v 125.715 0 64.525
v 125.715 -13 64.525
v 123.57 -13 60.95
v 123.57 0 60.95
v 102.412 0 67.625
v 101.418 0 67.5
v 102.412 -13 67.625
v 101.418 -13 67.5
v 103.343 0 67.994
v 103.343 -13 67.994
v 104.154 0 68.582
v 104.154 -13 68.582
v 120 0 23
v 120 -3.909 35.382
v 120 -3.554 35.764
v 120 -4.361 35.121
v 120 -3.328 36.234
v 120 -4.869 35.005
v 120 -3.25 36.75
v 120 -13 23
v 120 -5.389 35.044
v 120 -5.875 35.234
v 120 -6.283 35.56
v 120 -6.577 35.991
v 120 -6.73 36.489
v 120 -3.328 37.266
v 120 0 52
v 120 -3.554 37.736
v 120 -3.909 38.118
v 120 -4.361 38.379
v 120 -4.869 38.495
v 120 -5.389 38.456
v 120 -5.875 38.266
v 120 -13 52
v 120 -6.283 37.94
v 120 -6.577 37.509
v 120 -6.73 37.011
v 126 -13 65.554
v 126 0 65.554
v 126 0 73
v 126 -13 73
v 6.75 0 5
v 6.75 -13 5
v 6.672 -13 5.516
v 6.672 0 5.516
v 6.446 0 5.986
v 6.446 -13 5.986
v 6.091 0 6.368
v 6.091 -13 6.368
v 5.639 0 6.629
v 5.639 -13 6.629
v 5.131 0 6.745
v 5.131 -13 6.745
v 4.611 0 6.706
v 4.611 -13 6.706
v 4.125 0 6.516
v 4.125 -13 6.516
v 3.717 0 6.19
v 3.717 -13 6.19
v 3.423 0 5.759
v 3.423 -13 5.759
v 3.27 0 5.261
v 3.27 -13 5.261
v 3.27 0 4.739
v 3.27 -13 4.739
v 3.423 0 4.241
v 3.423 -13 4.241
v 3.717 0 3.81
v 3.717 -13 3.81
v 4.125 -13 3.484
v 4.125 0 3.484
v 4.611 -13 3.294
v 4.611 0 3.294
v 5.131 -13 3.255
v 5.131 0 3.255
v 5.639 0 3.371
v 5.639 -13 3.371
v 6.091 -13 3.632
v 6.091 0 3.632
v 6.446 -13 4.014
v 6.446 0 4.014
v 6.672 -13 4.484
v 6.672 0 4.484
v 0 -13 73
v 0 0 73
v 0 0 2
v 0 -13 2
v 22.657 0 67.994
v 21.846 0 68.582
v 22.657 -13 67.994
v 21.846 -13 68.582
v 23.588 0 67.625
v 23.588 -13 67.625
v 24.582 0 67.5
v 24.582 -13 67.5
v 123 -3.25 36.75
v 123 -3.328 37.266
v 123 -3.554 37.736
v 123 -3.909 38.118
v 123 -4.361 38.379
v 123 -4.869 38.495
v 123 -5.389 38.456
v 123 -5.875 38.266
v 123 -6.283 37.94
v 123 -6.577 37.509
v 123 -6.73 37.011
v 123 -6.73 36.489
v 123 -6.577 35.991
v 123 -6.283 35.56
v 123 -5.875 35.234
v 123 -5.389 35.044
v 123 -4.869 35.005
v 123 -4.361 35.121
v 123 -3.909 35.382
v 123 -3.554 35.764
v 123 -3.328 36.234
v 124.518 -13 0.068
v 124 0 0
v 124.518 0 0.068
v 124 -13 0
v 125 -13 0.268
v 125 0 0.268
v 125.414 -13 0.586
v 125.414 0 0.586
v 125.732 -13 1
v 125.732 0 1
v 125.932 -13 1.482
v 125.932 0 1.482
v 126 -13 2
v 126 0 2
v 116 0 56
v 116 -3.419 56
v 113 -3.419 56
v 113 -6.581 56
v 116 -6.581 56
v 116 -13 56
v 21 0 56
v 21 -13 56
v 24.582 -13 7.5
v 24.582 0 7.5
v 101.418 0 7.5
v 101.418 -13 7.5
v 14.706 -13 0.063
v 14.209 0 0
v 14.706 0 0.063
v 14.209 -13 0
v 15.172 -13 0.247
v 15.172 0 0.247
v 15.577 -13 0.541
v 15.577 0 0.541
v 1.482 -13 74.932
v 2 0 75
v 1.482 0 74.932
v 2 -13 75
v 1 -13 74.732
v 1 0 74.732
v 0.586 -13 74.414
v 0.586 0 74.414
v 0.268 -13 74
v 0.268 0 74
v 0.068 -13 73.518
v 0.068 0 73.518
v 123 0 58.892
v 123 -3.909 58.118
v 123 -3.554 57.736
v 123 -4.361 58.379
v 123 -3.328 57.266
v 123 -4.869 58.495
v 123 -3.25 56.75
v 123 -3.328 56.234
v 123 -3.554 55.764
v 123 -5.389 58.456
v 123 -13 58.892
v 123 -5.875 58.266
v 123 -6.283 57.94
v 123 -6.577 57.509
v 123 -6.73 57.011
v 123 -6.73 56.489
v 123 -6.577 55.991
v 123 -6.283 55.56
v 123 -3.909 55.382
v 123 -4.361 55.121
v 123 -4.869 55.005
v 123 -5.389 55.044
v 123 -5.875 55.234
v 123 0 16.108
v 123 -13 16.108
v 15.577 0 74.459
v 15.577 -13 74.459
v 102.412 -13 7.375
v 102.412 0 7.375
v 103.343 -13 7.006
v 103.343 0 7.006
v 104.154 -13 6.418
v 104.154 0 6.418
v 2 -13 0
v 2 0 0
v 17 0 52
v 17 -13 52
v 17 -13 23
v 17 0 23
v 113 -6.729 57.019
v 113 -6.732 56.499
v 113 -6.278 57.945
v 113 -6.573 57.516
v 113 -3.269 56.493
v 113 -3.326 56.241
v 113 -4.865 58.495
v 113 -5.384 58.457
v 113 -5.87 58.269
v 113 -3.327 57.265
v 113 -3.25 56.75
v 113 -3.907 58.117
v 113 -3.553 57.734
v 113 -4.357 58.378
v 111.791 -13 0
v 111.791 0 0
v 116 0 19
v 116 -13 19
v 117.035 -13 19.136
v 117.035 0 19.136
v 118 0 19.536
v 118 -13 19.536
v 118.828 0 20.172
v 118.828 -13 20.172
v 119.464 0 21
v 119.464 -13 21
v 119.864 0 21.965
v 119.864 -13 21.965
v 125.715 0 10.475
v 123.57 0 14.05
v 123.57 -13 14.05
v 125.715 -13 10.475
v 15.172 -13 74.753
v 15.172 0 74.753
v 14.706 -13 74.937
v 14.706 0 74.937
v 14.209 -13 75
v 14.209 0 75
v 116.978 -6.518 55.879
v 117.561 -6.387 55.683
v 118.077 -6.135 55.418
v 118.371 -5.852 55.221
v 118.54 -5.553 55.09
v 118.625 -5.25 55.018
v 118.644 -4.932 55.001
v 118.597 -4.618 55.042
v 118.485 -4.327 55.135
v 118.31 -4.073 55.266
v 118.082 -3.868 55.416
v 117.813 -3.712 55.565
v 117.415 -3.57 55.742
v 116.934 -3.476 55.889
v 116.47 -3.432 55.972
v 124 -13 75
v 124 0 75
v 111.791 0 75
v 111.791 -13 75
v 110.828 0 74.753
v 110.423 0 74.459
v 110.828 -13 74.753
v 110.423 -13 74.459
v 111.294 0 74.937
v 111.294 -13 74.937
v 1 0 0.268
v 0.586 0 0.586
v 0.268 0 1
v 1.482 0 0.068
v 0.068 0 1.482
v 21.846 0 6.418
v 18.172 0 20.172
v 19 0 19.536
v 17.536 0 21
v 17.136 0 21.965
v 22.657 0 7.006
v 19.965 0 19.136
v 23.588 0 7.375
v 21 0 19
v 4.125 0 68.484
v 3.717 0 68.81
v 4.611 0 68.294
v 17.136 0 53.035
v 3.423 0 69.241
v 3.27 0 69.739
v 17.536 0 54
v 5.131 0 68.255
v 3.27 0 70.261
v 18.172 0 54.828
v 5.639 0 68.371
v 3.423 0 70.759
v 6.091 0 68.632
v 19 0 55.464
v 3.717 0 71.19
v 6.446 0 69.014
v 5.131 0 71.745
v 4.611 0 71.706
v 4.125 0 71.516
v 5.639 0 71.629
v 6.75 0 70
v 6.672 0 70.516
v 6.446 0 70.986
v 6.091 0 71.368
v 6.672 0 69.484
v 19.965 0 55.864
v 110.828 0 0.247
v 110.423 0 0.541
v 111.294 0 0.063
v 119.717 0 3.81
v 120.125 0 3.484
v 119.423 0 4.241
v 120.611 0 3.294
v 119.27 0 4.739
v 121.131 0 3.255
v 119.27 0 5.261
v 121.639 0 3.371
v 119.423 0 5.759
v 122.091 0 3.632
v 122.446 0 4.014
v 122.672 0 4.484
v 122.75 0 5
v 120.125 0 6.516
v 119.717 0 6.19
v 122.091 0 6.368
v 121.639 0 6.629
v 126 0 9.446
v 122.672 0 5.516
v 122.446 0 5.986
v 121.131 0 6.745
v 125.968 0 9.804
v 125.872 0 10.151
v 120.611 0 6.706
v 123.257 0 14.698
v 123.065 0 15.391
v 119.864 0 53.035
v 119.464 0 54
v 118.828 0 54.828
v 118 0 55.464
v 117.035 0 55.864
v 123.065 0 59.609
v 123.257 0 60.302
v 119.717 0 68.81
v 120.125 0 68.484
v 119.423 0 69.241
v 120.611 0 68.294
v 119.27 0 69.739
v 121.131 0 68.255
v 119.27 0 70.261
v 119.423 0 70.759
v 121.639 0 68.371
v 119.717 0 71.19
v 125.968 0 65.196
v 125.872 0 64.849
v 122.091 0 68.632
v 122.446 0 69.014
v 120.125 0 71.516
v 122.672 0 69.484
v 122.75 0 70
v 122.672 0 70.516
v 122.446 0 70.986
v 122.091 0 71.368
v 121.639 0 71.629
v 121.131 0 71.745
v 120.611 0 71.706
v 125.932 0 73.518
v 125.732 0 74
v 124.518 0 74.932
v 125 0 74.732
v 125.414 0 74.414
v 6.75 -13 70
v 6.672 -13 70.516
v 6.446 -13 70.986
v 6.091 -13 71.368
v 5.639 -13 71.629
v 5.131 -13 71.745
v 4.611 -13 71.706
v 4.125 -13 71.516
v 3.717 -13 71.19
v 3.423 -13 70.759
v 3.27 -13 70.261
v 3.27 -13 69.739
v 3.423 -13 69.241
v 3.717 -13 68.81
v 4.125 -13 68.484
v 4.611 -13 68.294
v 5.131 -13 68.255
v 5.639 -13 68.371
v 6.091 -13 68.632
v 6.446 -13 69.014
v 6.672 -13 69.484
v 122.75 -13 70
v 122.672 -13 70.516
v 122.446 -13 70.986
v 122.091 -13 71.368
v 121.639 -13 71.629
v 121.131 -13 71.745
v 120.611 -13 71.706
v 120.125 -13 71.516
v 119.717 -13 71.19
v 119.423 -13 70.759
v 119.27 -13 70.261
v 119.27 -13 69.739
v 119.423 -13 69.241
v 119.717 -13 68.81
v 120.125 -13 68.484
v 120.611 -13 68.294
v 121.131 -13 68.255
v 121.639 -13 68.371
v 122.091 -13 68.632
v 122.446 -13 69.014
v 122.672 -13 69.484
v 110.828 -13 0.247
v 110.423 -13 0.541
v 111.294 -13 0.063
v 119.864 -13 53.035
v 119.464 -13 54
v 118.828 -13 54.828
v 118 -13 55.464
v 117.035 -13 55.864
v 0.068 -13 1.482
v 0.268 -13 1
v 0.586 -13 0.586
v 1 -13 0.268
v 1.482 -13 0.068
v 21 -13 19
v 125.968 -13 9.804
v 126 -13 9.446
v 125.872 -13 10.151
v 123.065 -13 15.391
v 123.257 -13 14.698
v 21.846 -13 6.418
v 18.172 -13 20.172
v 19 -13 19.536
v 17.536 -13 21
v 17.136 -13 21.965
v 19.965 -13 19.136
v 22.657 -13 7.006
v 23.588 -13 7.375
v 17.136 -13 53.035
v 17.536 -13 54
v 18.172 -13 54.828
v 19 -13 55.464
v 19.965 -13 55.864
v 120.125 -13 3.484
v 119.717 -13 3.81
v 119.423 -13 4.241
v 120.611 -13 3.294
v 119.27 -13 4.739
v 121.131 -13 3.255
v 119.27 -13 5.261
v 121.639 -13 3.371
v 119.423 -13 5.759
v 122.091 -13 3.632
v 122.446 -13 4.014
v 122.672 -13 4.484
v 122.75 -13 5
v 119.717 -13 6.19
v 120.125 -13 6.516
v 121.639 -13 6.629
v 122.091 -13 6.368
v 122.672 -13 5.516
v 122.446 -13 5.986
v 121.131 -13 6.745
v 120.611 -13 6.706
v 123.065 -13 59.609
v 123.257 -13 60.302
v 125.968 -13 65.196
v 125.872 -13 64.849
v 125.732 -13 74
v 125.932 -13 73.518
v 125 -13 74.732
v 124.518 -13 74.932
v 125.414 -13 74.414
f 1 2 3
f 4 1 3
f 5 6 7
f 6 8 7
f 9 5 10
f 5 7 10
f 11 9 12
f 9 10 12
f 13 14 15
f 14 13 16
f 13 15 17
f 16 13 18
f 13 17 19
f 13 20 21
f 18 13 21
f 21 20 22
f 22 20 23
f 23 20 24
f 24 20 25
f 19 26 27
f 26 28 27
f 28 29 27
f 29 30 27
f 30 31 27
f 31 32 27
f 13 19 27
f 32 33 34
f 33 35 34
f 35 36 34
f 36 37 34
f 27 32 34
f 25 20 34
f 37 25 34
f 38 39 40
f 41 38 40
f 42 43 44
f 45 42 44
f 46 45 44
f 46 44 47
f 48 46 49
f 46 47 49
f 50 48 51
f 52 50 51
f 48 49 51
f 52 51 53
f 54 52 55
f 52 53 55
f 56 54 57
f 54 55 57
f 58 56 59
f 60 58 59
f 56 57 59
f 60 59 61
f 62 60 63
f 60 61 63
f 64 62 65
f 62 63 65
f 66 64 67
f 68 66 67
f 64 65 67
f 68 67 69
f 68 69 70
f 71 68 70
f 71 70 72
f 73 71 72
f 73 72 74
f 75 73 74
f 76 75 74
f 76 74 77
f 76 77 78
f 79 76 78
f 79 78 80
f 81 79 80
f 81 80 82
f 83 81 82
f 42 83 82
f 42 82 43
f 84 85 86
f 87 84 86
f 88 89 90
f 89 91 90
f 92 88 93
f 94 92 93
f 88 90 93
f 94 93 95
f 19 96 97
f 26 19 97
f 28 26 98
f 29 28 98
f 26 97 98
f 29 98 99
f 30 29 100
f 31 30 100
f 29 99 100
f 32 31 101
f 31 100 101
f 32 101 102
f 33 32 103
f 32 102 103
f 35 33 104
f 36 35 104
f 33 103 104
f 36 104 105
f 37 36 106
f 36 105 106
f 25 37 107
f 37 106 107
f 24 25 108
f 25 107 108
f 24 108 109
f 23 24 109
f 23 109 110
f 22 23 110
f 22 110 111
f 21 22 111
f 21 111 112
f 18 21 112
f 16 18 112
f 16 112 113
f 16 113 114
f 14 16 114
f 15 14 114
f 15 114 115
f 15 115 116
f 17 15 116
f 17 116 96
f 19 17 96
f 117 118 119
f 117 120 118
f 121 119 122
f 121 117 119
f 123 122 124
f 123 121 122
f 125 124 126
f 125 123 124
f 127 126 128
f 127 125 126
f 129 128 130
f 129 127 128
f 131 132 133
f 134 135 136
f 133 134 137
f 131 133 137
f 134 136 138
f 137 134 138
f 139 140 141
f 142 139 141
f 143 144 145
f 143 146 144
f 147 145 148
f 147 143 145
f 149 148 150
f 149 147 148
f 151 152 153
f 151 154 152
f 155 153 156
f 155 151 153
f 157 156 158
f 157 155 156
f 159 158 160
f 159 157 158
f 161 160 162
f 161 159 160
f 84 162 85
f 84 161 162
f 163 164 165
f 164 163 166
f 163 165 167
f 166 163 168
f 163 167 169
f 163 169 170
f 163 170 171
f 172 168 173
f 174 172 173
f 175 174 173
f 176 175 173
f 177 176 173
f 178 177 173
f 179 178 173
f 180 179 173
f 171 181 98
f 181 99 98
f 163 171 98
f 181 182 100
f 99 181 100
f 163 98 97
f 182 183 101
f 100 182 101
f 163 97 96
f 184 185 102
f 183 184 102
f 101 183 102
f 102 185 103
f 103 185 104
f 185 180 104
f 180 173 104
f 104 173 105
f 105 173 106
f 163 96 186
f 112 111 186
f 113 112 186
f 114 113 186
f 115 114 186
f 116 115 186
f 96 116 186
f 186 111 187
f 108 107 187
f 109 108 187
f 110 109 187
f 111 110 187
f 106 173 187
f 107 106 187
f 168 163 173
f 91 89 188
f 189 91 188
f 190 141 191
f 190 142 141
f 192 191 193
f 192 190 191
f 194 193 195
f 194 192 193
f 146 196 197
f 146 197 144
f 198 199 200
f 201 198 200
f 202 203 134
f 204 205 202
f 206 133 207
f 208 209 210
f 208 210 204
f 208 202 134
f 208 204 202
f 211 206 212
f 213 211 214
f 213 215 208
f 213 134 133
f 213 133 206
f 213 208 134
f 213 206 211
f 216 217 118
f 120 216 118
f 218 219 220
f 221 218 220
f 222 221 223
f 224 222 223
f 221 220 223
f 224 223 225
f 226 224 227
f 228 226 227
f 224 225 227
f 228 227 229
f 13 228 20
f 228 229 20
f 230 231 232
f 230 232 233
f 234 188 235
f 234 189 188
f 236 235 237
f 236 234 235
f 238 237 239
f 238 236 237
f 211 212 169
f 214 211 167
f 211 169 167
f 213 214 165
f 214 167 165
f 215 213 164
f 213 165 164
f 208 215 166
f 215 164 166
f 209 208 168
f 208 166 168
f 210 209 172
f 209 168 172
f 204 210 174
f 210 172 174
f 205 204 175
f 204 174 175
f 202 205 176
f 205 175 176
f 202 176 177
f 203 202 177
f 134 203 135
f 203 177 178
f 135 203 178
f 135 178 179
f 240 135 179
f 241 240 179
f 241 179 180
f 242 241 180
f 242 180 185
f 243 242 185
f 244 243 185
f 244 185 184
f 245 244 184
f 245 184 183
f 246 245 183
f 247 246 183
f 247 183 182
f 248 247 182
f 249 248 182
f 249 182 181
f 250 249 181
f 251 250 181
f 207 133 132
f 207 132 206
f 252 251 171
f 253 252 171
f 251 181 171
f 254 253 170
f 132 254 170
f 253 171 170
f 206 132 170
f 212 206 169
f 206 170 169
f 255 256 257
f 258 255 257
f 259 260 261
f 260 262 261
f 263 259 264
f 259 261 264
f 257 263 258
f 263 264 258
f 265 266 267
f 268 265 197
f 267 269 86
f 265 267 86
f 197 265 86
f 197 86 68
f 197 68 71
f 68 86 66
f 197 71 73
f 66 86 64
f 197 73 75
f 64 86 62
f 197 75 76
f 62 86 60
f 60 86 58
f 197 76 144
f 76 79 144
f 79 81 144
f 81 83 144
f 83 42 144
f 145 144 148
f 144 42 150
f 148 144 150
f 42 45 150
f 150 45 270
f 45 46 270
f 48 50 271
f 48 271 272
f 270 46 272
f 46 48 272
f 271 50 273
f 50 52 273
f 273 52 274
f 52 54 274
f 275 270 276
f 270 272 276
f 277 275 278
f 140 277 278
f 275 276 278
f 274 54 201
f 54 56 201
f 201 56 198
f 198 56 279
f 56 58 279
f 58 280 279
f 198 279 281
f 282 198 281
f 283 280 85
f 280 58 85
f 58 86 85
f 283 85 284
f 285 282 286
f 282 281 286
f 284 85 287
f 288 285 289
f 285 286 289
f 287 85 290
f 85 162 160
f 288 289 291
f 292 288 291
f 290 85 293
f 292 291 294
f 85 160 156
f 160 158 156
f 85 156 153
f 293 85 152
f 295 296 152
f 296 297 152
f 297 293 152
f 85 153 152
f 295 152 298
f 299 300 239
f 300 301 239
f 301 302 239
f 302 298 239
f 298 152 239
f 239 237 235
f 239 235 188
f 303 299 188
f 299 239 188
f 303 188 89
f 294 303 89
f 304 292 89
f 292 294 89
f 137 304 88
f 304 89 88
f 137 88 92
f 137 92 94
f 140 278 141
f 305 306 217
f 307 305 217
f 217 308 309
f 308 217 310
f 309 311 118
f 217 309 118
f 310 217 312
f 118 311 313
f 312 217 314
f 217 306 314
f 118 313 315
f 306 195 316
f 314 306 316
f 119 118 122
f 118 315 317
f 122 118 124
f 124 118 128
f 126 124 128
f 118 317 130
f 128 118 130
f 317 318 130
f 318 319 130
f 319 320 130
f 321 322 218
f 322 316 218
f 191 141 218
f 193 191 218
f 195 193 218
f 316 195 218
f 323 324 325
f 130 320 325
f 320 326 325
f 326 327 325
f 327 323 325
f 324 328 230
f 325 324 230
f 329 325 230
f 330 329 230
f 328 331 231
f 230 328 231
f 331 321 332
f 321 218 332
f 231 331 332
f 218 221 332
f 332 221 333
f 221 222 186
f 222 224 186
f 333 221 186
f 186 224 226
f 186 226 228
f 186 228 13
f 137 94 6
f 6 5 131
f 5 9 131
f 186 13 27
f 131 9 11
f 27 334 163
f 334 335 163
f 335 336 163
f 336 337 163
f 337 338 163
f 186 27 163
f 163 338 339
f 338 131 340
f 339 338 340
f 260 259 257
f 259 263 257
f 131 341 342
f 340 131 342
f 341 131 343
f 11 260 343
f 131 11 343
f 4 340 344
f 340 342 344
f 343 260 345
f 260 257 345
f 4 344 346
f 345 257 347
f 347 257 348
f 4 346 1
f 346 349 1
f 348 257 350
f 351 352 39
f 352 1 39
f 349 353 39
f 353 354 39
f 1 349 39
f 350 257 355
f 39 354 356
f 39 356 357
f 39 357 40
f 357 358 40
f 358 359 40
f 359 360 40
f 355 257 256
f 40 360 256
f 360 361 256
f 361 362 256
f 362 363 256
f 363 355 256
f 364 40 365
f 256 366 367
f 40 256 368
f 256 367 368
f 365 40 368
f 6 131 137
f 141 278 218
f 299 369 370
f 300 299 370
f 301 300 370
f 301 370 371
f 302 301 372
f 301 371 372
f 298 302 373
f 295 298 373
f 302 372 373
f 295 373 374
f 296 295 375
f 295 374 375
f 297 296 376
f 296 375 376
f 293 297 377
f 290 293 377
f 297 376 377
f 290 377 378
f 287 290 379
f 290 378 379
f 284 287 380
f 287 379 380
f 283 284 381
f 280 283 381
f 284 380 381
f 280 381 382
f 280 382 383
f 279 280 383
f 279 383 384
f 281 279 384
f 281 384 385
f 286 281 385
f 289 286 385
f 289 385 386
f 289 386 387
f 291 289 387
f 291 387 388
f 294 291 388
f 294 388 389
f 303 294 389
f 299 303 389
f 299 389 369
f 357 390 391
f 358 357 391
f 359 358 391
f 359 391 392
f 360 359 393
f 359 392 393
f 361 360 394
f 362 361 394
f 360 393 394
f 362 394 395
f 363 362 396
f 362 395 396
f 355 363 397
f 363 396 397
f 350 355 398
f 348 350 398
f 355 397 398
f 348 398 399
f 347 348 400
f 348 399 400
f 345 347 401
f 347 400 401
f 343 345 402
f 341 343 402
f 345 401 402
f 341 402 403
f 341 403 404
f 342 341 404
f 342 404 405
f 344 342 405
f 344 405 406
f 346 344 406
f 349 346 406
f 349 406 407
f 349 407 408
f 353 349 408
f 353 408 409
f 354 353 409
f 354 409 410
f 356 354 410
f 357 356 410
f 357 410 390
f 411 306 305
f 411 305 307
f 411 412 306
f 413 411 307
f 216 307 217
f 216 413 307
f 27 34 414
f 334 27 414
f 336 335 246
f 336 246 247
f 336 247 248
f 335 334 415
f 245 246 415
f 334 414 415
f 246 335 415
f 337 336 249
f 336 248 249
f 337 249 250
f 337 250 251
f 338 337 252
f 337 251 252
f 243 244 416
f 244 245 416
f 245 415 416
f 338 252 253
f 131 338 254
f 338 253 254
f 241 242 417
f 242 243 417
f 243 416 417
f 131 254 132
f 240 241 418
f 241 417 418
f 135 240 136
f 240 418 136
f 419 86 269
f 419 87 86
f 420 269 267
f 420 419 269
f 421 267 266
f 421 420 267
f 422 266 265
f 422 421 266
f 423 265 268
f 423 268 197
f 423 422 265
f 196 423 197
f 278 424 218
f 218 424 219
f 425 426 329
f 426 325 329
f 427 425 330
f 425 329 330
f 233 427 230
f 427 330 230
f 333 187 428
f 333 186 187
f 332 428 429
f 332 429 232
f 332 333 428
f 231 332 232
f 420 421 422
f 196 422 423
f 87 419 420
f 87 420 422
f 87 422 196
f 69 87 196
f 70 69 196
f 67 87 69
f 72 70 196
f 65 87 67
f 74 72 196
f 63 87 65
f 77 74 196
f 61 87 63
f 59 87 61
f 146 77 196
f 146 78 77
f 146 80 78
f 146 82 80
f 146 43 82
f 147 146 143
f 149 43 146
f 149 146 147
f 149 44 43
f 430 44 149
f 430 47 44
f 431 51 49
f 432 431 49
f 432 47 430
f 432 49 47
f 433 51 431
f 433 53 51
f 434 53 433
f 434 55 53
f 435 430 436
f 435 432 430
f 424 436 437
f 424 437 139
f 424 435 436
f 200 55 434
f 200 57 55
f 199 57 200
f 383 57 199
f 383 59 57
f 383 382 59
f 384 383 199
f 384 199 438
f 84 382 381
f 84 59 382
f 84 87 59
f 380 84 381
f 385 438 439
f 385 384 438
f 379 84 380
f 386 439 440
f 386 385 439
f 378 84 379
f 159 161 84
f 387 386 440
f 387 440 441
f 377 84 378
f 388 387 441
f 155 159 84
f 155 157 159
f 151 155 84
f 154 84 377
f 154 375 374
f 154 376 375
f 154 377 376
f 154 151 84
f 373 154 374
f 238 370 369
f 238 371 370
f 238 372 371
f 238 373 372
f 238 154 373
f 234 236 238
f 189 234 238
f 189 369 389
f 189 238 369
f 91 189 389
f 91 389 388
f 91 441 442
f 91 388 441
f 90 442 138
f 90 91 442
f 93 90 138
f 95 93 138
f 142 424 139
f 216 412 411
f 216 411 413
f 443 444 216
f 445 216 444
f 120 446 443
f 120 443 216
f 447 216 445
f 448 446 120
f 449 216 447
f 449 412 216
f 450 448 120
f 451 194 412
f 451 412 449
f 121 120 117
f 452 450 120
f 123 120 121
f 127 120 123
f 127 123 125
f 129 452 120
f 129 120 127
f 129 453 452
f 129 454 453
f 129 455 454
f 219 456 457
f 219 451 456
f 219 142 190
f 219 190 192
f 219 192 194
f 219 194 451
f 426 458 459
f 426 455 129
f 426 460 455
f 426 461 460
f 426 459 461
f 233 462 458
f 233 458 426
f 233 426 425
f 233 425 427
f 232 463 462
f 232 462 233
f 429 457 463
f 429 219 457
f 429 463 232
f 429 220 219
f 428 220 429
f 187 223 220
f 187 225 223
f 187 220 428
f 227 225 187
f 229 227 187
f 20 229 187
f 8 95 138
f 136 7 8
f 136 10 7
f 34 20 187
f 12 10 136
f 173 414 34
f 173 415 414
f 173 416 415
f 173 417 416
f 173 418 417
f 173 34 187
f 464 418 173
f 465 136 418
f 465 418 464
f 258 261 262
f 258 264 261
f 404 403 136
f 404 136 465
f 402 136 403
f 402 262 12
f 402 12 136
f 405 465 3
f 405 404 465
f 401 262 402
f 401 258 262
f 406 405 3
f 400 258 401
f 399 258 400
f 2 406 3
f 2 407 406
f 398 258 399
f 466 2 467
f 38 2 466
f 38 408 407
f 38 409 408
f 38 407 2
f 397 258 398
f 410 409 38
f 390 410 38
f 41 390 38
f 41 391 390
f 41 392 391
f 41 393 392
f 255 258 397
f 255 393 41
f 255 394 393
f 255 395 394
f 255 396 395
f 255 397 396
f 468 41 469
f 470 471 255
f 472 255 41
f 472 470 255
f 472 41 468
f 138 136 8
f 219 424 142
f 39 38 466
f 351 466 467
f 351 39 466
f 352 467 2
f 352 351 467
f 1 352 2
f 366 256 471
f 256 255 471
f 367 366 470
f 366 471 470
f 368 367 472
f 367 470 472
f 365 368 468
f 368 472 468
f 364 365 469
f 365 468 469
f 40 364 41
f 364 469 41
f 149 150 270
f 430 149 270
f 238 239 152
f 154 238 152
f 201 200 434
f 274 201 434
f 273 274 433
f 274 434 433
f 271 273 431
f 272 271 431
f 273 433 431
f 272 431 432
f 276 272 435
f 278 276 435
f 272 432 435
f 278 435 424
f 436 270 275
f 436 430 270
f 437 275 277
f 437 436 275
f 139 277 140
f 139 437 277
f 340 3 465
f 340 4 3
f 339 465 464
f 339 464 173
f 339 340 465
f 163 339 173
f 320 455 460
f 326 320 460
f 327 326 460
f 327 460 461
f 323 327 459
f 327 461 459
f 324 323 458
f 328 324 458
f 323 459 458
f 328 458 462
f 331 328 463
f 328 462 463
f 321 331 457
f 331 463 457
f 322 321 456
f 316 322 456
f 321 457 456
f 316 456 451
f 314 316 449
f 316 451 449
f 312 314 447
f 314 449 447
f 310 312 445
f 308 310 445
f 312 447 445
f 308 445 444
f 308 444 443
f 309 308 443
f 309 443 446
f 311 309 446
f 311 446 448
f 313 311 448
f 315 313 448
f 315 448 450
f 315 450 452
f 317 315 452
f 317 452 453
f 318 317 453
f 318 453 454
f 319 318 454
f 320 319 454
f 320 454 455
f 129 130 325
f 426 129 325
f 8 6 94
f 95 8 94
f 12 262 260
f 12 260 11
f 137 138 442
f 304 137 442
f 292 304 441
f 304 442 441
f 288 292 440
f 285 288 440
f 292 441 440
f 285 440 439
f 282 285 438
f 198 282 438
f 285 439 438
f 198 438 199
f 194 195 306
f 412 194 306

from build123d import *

# Parameters (mm, degrees)
F1_DEPTH = 13
F3_DEPTH = 25
F5_DEPTH = 25
F6_R     = 1.75
F7_DEPTH = 10
F8_R     = 1.75
F9_DEPTH = 25
F10_R    = 4
F11_R    = 2


with BuildPart() as f1:
    # F0 (on Front) → F1 (new body)
    with BuildSketch(Plane.XZ):
        Polygon((0, 75), (0, 0), (15, 0), (23, 7.5), (103, 7.5), (111, 0), (126, 0), (126, 75), (111, 75), (103, 67.5), (23, 67.5), (15, 75), align=None)
    extrude(amount=F1_DEPTH)

    # F2 (on face) → F3 (cut)
    with BuildSketch(Plane.XZ.offset(13)):
        with BuildLine():
            Line((116, 56), (21, 56))
            ThreePointArc((21, 56), (18.1715728753, 54.8284271247), (17, 52))
            Line((17, 52), (17, 23))
            ThreePointArc((17, 23), (18.1715728753, 20.1715728753), (21, 19))
            Line((21, 19), (116, 19))
            ThreePointArc((116, 19), (118.8284271247, 20.1715728753), (120, 23))
            Line((120, 23), (120, 52))
            ThreePointArc((120, 52), (118.8284271247, 54.8284271247), (116, 56))
        make_face()
    extrude(amount=-F3_DEPTH, mode=Mode.SUBTRACT)

    # F4 (on face) → F5 (cut)
    with BuildSketch(Plane.XZ.offset(13)):
        Polygon((126, 65), (123, 60), (123, 15), (126, 10), align=None)
    extrude(amount=-F5_DEPTH, mode=Mode.SUBTRACT)

    # F6 (on face) → F7 (cut)
    with BuildSketch(Plane.YZ.offset(123)):
        with Locations((-5, 36.75)):
            Circle(F6_R)
        with Locations((-5, 56.75)):
            Circle(F6_R)
    extrude(amount=-F7_DEPTH, mode=Mode.SUBTRACT)

    # F8 (on face) → F9 (cut)
    with BuildSketch(Plane.XZ.offset(13)):
        with Locations((5, 70)):
            Circle(F8_R)
        with Locations((5, 5)):
            Circle(F8_R)
        with Locations((121, 5)):
            Circle(F8_R)
        with Locations((121, 70)):
            Circle(F8_R)
    extrude(amount=-F9_DEPTH, mode=Mode.SUBTRACT)

    # F10
    f10_edges = [f1.edges().sort_by_distance(p)[0] for p in [
        (23, -6.5, 7.5),
        (103, -6.5, 7.5),
        (123, -6.5, 15),
        (123, -6.5, 60),
        (103, -6.5, 67.5),
        (23, -6.5, 67.5),
    ]]
    fillet(f10_edges, radius=F10_R)

    # F11
    f11_edges = [f1.edges().sort_by_distance(p)[0] for p in [
        (0, -6.5, 75),
        (0, -6.5, 0),
        (15, -6.5, 0),
        (111, -6.5, 0),
        (126, -6.5, 0),
        (126, -6.5, 10),
        (126, -6.5, 65),
        (126, -6.5, 75),
        (111, -6.5, 75),
        (15, -6.5, 75),
    ]]
    fillet(f11_edges, radius=F11_R)


solid = f1.part
